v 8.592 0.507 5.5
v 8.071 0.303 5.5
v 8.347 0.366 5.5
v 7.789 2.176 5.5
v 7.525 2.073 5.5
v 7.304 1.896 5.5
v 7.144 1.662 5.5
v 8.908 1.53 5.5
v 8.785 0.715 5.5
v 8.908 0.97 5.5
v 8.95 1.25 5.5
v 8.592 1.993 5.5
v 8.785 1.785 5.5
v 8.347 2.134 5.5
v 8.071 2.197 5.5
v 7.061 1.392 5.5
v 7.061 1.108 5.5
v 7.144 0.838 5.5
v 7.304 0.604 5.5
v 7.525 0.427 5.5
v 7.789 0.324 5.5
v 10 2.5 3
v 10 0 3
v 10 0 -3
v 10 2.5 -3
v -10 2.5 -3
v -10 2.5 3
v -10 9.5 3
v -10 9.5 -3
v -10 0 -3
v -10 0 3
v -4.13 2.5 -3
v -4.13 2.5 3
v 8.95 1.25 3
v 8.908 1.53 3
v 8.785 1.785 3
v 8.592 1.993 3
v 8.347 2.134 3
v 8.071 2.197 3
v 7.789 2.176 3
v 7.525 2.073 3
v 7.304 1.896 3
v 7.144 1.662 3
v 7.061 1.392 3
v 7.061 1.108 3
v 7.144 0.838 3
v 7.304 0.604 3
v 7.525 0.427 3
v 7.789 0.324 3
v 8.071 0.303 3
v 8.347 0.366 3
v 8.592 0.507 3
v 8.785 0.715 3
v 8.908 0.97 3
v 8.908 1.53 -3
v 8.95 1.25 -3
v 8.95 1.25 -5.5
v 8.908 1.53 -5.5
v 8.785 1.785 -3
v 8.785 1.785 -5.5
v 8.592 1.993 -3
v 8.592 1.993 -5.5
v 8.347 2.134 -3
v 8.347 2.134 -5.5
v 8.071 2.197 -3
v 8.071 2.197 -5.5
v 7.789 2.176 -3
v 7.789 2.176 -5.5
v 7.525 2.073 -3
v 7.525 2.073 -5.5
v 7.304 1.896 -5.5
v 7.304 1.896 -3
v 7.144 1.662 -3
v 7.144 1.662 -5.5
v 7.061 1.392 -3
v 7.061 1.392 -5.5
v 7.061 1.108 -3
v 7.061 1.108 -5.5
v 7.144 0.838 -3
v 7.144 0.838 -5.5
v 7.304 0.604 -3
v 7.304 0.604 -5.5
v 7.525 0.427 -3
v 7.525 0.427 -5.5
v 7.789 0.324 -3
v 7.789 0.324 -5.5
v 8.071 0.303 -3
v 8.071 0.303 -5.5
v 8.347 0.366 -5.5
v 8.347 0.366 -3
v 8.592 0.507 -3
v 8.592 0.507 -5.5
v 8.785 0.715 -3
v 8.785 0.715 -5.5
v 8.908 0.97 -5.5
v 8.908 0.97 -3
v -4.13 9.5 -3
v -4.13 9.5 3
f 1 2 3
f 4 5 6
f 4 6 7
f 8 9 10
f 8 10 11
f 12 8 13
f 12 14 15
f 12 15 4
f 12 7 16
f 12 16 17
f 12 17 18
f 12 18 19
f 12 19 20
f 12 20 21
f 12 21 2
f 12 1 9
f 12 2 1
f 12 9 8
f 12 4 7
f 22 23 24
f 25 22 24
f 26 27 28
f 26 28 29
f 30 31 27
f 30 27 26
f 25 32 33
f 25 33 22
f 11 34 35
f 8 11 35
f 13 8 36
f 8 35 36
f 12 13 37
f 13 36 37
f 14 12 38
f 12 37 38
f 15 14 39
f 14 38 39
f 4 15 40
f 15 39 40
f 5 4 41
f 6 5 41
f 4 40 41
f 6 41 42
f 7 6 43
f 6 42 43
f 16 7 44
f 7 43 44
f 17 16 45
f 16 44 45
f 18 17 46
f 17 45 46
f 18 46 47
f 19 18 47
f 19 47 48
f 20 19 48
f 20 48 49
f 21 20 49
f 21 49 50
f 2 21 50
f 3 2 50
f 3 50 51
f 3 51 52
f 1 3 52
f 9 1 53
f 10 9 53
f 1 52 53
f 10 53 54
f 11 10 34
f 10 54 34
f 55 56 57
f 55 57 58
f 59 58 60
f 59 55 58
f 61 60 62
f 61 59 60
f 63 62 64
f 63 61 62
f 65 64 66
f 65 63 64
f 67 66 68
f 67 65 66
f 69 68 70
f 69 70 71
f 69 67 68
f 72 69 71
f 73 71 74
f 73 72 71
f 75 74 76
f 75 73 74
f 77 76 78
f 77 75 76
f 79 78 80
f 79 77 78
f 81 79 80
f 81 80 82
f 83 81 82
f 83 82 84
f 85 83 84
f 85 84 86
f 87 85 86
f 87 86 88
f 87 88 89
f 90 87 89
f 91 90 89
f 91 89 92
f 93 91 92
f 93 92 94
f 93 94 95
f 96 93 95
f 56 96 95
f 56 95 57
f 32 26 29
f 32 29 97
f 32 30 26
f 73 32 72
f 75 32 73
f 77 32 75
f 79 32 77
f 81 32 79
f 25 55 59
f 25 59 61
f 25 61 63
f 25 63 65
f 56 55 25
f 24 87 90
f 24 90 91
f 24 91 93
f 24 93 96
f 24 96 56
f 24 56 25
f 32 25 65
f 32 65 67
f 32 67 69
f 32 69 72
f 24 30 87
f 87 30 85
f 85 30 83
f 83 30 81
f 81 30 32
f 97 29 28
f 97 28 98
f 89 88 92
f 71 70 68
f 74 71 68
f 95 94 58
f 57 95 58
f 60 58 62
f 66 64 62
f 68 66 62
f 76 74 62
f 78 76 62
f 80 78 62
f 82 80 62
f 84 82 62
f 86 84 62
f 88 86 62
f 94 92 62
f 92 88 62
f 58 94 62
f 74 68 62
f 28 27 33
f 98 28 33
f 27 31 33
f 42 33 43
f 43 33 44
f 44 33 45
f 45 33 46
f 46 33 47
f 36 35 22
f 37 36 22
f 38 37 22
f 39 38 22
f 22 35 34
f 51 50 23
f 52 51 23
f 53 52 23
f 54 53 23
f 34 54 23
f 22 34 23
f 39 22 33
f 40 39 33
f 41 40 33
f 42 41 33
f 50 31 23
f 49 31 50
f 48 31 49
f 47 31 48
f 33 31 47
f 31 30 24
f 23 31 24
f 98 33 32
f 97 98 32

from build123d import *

# Parameters (mm, degrees)
SKETCH1_W                = 20
SKETCH1_H                = 6
BOSS_EXTRUDE1_DEPTH      = 2.5
SKETCH2_R                = 0.95
BOSS_EXTRUDE2_DEPTH      = 2.5
BOSS_EXTRUDE2_DEPTH_BACK = 8.5
SKETCH4_W                = 5.869913051
SKETCH4_H                = 6
BOSS_EXTRUDE3_DEPTH      = 7


with BuildPart() as part:
    # Sketch1 → Boss-Extrude1 (new body)
    with BuildSketch(Plane(origin=(0, 0, 0), x_dir=(1, 0, 0), z_dir=(0, 1, 0))):
        Rectangle(SKETCH1_W, SKETCH1_H)
    extrude(amount=BOSS_EXTRUDE1_DEPTH)

    # Sketch2 → Boss-Extrude2 (add, two sides)
    with BuildSketch(Plane.XY.offset(3)) as boss_extrude2_sk:
        with Locations((8, 1.25)):
            Circle(SKETCH2_R)
    extrude(amount=BOSS_EXTRUDE2_DEPTH)
    extrude(boss_extrude2_sk.sketch, amount=-BOSS_EXTRUDE2_DEPTH_BACK)

    # Sketch4 → Boss-Extrude3 (add)
    with BuildSketch(Plane(origin=(0, 2.5, 0), x_dir=(1, 0, 0), z_dir=(0, 1, 0))):
        with Locations((-7.065043474, 0)):
            Rectangle(SKETCH4_W, SKETCH4_H)
    extrude(amount=BOSS_EXTRUDE3_DEPTH)


solid = part.part
